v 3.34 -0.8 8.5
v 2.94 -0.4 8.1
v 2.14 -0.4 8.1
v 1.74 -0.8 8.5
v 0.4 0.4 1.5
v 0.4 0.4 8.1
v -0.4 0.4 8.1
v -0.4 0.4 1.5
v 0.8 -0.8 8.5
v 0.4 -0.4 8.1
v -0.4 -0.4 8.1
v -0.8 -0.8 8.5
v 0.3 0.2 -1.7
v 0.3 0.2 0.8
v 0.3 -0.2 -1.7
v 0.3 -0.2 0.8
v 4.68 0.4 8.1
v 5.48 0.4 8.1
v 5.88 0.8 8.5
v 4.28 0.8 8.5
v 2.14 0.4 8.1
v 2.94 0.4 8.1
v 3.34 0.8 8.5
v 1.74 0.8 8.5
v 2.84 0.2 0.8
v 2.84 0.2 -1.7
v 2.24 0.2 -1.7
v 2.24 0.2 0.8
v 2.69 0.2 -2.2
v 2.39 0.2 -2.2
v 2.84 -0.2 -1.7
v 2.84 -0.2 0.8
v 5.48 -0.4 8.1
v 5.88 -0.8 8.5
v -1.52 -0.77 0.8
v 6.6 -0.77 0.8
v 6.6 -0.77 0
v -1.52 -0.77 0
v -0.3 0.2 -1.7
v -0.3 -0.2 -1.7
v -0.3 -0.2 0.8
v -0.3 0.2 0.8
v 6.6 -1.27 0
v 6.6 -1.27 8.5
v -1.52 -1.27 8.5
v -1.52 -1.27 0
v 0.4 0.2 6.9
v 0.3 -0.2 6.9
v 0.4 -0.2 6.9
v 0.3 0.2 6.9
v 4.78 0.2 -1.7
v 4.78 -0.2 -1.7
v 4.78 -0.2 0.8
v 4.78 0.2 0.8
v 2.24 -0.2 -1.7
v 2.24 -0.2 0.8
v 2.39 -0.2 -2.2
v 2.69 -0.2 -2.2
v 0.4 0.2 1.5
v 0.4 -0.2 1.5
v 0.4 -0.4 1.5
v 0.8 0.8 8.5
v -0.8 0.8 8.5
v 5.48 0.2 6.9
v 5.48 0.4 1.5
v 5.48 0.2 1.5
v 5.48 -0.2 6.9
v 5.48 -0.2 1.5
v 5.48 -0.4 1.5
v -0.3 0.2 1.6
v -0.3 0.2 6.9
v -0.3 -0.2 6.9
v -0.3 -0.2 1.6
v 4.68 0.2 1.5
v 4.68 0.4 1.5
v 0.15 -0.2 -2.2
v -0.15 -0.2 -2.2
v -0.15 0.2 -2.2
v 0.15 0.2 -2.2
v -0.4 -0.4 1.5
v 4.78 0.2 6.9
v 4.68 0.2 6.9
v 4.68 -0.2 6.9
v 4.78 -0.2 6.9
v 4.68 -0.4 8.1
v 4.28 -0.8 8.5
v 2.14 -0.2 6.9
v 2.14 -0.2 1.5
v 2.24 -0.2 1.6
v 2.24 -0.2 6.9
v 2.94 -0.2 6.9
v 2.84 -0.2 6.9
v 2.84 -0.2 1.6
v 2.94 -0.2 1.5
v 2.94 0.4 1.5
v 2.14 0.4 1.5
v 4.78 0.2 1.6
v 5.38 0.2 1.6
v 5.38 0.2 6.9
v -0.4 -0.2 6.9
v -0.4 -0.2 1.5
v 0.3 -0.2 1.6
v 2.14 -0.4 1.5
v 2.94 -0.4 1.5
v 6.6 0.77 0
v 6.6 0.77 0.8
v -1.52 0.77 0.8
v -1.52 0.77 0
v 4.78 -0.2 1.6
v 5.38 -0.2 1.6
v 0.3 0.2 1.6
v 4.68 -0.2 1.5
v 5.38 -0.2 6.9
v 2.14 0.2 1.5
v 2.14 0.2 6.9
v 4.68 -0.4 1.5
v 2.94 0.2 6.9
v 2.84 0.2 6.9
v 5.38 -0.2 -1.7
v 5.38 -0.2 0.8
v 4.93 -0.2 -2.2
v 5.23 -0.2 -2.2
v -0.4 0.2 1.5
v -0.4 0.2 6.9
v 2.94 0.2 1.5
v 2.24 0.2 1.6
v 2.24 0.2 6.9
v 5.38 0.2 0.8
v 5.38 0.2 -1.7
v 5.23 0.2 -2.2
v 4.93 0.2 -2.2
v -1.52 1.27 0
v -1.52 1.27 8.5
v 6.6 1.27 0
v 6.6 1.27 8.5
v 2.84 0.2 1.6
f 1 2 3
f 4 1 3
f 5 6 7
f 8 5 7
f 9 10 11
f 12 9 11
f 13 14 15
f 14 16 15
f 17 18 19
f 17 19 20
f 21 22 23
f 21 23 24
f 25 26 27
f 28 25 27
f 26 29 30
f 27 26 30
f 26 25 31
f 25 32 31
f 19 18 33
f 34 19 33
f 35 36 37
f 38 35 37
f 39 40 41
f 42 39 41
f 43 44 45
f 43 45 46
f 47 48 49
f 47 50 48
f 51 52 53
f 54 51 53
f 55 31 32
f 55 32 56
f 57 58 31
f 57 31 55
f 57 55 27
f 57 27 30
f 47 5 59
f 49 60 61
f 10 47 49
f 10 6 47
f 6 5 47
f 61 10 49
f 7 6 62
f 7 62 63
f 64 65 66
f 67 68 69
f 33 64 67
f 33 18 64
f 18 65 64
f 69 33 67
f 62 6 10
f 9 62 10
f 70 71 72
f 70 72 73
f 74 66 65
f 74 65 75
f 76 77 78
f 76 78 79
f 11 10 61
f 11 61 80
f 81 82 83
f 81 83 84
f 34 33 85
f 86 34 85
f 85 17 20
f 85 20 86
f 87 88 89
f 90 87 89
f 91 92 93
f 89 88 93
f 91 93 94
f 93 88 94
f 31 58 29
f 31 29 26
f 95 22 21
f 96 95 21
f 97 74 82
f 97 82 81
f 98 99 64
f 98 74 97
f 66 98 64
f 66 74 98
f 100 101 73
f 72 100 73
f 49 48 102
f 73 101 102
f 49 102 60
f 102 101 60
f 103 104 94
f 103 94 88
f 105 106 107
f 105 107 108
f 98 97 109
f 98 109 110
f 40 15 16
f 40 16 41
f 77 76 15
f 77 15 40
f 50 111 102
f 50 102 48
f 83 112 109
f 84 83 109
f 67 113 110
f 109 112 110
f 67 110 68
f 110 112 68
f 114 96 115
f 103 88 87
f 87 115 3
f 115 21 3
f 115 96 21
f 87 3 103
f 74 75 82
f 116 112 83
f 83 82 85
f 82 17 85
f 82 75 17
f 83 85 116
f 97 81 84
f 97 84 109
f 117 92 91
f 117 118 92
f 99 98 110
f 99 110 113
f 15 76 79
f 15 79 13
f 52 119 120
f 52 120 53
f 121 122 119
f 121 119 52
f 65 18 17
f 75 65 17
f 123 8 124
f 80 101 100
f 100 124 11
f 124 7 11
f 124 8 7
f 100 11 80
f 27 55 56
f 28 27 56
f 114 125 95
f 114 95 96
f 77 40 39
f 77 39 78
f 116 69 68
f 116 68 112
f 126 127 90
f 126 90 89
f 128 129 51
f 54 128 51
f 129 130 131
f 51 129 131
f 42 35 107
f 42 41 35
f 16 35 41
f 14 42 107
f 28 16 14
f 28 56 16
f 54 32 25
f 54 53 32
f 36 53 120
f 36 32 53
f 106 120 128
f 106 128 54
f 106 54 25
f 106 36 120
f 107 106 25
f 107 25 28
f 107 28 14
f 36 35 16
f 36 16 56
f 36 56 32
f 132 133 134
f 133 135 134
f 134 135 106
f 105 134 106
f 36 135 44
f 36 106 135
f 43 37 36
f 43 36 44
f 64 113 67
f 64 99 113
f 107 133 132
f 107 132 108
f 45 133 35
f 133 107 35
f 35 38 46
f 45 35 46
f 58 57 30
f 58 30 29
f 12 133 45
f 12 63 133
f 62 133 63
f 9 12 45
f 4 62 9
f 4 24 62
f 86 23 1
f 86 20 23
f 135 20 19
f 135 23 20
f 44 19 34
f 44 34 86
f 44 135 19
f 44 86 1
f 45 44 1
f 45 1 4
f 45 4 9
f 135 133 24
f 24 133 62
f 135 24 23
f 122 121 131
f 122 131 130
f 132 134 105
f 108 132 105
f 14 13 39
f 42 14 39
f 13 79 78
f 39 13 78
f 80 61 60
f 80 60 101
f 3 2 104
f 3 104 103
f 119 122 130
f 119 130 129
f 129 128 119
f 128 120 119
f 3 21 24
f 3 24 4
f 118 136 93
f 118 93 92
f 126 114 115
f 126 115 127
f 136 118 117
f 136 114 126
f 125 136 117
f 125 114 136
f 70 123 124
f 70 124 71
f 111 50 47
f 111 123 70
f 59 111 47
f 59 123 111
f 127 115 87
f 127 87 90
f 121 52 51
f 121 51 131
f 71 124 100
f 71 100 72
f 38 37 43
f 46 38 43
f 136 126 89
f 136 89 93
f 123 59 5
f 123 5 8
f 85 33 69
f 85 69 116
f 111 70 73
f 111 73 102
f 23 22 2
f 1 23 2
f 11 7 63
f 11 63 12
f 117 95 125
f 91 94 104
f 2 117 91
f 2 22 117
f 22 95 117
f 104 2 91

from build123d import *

# Parameters (mm, degrees)
SKETCH1_W           = 2.54
SKETCH1_H           = 8.5
BOSS_EXTRUDE1_DEPTH = 1.52
SKETCH_1_W          = 0.8
SKETCH_1_H          = 1.54
CUT_EXTRUDE_1_DEPTH = 10.116166958
SKETCH2_W           = 0.8
SKETCH2_H           = 0.8
CUT_EXTRUDE1_DEPTH  = 7
CHAMFER_1_SIZE      = 0.4
BOSS_EXTRUDE2_DEPTH = 0.2
LPATTERN1_COUNT     = 3
LPATTERN1_PITCH     = 2.54


with BuildPart() as part:
    # Sketch1 → Boss-Extrude1 (new, symmetric)
    with BuildSketch(Plane(origin=(0, 0, 0), x_dir=(0, -1, 0), z_dir=(1, 0, 0))):
        with Locations((0, -4.25)):
            Rectangle(SKETCH1_W, SKETCH1_H)
    extrude(amount=BOSS_EXTRUDE1_DEPTH, both=True)

    # Эскиз1 → Вырез-Вытянуть1 (cut, through all)
    with BuildSketch(Plane(origin=(1.52, 0, 0), x_dir=(0, 0, -1), z_dir=(1, 0, 0))):
        with Locations((-0.4, 0)):
            Rectangle(SKETCH_1_W, SKETCH_1_H)
    extrude(amount=-CUT_EXTRUDE_1_DEPTH, mode=Mode.SUBTRACT)

    # Sketch2 → Cut-Extrude1 (cut)
    with BuildSketch(Plane(origin=(0, 0, 8.5), x_dir=(-1, 0, 0), z_dir=(0, 0, 1))):
        Rectangle(SKETCH2_W, SKETCH2_H)
    extrude(amount=-CUT_EXTRUDE1_DEPTH, mode=Mode.SUBTRACT)

    # Фаска1
    chamfer_1_edges = [part.edges().sort_by_distance(p)[0] for p in [
        (-0.4, 0, 8.5),
        (0, -0.4, 8.5),
        (0.4, 0, 8.5),
        (0, 0.4, 8.5),
    ]]
    chamfer(chamfer_1_edges, length=CHAMFER_1_SIZE)

    # Sketch3 → Boss-Extrude2 (add, symmetric)
    with BuildSketch(Plane(origin=(0, 0, 0), x_dir=(1, 0, 0), z_dir=(0, 1, 0))):
        Polygon((-0.3, 0), (-0.3, 1.7), (-0.15, 2.2), (0.15, 2.2), (0.3, 1.7), (0.3, 0), (0.3, -0.8), (-0.3, -0.8), align=None)
        Polygon((0.4, -1.5), (-0.4, -1.5), (-0.4, -6.9), (-0.3, -6.9), (-0.3, -1.6), (0.3, -1.6), (0.3, -6.9), (0.4, -6.9), align=None)
    extrude(amount=BOSS_EXTRUDE2_DEPTH, both=True)


with BuildPart() as lpattern1_1:
    # LPattern1: pattern copy
    add(part.part.moved(Location(Vector(1, 0, 0) * (1 * LPATTERN1_PITCH))))


with BuildPart() as lpattern1_2:
    # LPattern1: pattern copy
    add(part.part.moved(Location(Vector(1, 0, 0) * (2 * LPATTERN1_PITCH))))

    # Combine 1: union LPattern1_1, part
    add(lpattern1_1.part)
    add(part.part)


solid = lpattern1_2.part
